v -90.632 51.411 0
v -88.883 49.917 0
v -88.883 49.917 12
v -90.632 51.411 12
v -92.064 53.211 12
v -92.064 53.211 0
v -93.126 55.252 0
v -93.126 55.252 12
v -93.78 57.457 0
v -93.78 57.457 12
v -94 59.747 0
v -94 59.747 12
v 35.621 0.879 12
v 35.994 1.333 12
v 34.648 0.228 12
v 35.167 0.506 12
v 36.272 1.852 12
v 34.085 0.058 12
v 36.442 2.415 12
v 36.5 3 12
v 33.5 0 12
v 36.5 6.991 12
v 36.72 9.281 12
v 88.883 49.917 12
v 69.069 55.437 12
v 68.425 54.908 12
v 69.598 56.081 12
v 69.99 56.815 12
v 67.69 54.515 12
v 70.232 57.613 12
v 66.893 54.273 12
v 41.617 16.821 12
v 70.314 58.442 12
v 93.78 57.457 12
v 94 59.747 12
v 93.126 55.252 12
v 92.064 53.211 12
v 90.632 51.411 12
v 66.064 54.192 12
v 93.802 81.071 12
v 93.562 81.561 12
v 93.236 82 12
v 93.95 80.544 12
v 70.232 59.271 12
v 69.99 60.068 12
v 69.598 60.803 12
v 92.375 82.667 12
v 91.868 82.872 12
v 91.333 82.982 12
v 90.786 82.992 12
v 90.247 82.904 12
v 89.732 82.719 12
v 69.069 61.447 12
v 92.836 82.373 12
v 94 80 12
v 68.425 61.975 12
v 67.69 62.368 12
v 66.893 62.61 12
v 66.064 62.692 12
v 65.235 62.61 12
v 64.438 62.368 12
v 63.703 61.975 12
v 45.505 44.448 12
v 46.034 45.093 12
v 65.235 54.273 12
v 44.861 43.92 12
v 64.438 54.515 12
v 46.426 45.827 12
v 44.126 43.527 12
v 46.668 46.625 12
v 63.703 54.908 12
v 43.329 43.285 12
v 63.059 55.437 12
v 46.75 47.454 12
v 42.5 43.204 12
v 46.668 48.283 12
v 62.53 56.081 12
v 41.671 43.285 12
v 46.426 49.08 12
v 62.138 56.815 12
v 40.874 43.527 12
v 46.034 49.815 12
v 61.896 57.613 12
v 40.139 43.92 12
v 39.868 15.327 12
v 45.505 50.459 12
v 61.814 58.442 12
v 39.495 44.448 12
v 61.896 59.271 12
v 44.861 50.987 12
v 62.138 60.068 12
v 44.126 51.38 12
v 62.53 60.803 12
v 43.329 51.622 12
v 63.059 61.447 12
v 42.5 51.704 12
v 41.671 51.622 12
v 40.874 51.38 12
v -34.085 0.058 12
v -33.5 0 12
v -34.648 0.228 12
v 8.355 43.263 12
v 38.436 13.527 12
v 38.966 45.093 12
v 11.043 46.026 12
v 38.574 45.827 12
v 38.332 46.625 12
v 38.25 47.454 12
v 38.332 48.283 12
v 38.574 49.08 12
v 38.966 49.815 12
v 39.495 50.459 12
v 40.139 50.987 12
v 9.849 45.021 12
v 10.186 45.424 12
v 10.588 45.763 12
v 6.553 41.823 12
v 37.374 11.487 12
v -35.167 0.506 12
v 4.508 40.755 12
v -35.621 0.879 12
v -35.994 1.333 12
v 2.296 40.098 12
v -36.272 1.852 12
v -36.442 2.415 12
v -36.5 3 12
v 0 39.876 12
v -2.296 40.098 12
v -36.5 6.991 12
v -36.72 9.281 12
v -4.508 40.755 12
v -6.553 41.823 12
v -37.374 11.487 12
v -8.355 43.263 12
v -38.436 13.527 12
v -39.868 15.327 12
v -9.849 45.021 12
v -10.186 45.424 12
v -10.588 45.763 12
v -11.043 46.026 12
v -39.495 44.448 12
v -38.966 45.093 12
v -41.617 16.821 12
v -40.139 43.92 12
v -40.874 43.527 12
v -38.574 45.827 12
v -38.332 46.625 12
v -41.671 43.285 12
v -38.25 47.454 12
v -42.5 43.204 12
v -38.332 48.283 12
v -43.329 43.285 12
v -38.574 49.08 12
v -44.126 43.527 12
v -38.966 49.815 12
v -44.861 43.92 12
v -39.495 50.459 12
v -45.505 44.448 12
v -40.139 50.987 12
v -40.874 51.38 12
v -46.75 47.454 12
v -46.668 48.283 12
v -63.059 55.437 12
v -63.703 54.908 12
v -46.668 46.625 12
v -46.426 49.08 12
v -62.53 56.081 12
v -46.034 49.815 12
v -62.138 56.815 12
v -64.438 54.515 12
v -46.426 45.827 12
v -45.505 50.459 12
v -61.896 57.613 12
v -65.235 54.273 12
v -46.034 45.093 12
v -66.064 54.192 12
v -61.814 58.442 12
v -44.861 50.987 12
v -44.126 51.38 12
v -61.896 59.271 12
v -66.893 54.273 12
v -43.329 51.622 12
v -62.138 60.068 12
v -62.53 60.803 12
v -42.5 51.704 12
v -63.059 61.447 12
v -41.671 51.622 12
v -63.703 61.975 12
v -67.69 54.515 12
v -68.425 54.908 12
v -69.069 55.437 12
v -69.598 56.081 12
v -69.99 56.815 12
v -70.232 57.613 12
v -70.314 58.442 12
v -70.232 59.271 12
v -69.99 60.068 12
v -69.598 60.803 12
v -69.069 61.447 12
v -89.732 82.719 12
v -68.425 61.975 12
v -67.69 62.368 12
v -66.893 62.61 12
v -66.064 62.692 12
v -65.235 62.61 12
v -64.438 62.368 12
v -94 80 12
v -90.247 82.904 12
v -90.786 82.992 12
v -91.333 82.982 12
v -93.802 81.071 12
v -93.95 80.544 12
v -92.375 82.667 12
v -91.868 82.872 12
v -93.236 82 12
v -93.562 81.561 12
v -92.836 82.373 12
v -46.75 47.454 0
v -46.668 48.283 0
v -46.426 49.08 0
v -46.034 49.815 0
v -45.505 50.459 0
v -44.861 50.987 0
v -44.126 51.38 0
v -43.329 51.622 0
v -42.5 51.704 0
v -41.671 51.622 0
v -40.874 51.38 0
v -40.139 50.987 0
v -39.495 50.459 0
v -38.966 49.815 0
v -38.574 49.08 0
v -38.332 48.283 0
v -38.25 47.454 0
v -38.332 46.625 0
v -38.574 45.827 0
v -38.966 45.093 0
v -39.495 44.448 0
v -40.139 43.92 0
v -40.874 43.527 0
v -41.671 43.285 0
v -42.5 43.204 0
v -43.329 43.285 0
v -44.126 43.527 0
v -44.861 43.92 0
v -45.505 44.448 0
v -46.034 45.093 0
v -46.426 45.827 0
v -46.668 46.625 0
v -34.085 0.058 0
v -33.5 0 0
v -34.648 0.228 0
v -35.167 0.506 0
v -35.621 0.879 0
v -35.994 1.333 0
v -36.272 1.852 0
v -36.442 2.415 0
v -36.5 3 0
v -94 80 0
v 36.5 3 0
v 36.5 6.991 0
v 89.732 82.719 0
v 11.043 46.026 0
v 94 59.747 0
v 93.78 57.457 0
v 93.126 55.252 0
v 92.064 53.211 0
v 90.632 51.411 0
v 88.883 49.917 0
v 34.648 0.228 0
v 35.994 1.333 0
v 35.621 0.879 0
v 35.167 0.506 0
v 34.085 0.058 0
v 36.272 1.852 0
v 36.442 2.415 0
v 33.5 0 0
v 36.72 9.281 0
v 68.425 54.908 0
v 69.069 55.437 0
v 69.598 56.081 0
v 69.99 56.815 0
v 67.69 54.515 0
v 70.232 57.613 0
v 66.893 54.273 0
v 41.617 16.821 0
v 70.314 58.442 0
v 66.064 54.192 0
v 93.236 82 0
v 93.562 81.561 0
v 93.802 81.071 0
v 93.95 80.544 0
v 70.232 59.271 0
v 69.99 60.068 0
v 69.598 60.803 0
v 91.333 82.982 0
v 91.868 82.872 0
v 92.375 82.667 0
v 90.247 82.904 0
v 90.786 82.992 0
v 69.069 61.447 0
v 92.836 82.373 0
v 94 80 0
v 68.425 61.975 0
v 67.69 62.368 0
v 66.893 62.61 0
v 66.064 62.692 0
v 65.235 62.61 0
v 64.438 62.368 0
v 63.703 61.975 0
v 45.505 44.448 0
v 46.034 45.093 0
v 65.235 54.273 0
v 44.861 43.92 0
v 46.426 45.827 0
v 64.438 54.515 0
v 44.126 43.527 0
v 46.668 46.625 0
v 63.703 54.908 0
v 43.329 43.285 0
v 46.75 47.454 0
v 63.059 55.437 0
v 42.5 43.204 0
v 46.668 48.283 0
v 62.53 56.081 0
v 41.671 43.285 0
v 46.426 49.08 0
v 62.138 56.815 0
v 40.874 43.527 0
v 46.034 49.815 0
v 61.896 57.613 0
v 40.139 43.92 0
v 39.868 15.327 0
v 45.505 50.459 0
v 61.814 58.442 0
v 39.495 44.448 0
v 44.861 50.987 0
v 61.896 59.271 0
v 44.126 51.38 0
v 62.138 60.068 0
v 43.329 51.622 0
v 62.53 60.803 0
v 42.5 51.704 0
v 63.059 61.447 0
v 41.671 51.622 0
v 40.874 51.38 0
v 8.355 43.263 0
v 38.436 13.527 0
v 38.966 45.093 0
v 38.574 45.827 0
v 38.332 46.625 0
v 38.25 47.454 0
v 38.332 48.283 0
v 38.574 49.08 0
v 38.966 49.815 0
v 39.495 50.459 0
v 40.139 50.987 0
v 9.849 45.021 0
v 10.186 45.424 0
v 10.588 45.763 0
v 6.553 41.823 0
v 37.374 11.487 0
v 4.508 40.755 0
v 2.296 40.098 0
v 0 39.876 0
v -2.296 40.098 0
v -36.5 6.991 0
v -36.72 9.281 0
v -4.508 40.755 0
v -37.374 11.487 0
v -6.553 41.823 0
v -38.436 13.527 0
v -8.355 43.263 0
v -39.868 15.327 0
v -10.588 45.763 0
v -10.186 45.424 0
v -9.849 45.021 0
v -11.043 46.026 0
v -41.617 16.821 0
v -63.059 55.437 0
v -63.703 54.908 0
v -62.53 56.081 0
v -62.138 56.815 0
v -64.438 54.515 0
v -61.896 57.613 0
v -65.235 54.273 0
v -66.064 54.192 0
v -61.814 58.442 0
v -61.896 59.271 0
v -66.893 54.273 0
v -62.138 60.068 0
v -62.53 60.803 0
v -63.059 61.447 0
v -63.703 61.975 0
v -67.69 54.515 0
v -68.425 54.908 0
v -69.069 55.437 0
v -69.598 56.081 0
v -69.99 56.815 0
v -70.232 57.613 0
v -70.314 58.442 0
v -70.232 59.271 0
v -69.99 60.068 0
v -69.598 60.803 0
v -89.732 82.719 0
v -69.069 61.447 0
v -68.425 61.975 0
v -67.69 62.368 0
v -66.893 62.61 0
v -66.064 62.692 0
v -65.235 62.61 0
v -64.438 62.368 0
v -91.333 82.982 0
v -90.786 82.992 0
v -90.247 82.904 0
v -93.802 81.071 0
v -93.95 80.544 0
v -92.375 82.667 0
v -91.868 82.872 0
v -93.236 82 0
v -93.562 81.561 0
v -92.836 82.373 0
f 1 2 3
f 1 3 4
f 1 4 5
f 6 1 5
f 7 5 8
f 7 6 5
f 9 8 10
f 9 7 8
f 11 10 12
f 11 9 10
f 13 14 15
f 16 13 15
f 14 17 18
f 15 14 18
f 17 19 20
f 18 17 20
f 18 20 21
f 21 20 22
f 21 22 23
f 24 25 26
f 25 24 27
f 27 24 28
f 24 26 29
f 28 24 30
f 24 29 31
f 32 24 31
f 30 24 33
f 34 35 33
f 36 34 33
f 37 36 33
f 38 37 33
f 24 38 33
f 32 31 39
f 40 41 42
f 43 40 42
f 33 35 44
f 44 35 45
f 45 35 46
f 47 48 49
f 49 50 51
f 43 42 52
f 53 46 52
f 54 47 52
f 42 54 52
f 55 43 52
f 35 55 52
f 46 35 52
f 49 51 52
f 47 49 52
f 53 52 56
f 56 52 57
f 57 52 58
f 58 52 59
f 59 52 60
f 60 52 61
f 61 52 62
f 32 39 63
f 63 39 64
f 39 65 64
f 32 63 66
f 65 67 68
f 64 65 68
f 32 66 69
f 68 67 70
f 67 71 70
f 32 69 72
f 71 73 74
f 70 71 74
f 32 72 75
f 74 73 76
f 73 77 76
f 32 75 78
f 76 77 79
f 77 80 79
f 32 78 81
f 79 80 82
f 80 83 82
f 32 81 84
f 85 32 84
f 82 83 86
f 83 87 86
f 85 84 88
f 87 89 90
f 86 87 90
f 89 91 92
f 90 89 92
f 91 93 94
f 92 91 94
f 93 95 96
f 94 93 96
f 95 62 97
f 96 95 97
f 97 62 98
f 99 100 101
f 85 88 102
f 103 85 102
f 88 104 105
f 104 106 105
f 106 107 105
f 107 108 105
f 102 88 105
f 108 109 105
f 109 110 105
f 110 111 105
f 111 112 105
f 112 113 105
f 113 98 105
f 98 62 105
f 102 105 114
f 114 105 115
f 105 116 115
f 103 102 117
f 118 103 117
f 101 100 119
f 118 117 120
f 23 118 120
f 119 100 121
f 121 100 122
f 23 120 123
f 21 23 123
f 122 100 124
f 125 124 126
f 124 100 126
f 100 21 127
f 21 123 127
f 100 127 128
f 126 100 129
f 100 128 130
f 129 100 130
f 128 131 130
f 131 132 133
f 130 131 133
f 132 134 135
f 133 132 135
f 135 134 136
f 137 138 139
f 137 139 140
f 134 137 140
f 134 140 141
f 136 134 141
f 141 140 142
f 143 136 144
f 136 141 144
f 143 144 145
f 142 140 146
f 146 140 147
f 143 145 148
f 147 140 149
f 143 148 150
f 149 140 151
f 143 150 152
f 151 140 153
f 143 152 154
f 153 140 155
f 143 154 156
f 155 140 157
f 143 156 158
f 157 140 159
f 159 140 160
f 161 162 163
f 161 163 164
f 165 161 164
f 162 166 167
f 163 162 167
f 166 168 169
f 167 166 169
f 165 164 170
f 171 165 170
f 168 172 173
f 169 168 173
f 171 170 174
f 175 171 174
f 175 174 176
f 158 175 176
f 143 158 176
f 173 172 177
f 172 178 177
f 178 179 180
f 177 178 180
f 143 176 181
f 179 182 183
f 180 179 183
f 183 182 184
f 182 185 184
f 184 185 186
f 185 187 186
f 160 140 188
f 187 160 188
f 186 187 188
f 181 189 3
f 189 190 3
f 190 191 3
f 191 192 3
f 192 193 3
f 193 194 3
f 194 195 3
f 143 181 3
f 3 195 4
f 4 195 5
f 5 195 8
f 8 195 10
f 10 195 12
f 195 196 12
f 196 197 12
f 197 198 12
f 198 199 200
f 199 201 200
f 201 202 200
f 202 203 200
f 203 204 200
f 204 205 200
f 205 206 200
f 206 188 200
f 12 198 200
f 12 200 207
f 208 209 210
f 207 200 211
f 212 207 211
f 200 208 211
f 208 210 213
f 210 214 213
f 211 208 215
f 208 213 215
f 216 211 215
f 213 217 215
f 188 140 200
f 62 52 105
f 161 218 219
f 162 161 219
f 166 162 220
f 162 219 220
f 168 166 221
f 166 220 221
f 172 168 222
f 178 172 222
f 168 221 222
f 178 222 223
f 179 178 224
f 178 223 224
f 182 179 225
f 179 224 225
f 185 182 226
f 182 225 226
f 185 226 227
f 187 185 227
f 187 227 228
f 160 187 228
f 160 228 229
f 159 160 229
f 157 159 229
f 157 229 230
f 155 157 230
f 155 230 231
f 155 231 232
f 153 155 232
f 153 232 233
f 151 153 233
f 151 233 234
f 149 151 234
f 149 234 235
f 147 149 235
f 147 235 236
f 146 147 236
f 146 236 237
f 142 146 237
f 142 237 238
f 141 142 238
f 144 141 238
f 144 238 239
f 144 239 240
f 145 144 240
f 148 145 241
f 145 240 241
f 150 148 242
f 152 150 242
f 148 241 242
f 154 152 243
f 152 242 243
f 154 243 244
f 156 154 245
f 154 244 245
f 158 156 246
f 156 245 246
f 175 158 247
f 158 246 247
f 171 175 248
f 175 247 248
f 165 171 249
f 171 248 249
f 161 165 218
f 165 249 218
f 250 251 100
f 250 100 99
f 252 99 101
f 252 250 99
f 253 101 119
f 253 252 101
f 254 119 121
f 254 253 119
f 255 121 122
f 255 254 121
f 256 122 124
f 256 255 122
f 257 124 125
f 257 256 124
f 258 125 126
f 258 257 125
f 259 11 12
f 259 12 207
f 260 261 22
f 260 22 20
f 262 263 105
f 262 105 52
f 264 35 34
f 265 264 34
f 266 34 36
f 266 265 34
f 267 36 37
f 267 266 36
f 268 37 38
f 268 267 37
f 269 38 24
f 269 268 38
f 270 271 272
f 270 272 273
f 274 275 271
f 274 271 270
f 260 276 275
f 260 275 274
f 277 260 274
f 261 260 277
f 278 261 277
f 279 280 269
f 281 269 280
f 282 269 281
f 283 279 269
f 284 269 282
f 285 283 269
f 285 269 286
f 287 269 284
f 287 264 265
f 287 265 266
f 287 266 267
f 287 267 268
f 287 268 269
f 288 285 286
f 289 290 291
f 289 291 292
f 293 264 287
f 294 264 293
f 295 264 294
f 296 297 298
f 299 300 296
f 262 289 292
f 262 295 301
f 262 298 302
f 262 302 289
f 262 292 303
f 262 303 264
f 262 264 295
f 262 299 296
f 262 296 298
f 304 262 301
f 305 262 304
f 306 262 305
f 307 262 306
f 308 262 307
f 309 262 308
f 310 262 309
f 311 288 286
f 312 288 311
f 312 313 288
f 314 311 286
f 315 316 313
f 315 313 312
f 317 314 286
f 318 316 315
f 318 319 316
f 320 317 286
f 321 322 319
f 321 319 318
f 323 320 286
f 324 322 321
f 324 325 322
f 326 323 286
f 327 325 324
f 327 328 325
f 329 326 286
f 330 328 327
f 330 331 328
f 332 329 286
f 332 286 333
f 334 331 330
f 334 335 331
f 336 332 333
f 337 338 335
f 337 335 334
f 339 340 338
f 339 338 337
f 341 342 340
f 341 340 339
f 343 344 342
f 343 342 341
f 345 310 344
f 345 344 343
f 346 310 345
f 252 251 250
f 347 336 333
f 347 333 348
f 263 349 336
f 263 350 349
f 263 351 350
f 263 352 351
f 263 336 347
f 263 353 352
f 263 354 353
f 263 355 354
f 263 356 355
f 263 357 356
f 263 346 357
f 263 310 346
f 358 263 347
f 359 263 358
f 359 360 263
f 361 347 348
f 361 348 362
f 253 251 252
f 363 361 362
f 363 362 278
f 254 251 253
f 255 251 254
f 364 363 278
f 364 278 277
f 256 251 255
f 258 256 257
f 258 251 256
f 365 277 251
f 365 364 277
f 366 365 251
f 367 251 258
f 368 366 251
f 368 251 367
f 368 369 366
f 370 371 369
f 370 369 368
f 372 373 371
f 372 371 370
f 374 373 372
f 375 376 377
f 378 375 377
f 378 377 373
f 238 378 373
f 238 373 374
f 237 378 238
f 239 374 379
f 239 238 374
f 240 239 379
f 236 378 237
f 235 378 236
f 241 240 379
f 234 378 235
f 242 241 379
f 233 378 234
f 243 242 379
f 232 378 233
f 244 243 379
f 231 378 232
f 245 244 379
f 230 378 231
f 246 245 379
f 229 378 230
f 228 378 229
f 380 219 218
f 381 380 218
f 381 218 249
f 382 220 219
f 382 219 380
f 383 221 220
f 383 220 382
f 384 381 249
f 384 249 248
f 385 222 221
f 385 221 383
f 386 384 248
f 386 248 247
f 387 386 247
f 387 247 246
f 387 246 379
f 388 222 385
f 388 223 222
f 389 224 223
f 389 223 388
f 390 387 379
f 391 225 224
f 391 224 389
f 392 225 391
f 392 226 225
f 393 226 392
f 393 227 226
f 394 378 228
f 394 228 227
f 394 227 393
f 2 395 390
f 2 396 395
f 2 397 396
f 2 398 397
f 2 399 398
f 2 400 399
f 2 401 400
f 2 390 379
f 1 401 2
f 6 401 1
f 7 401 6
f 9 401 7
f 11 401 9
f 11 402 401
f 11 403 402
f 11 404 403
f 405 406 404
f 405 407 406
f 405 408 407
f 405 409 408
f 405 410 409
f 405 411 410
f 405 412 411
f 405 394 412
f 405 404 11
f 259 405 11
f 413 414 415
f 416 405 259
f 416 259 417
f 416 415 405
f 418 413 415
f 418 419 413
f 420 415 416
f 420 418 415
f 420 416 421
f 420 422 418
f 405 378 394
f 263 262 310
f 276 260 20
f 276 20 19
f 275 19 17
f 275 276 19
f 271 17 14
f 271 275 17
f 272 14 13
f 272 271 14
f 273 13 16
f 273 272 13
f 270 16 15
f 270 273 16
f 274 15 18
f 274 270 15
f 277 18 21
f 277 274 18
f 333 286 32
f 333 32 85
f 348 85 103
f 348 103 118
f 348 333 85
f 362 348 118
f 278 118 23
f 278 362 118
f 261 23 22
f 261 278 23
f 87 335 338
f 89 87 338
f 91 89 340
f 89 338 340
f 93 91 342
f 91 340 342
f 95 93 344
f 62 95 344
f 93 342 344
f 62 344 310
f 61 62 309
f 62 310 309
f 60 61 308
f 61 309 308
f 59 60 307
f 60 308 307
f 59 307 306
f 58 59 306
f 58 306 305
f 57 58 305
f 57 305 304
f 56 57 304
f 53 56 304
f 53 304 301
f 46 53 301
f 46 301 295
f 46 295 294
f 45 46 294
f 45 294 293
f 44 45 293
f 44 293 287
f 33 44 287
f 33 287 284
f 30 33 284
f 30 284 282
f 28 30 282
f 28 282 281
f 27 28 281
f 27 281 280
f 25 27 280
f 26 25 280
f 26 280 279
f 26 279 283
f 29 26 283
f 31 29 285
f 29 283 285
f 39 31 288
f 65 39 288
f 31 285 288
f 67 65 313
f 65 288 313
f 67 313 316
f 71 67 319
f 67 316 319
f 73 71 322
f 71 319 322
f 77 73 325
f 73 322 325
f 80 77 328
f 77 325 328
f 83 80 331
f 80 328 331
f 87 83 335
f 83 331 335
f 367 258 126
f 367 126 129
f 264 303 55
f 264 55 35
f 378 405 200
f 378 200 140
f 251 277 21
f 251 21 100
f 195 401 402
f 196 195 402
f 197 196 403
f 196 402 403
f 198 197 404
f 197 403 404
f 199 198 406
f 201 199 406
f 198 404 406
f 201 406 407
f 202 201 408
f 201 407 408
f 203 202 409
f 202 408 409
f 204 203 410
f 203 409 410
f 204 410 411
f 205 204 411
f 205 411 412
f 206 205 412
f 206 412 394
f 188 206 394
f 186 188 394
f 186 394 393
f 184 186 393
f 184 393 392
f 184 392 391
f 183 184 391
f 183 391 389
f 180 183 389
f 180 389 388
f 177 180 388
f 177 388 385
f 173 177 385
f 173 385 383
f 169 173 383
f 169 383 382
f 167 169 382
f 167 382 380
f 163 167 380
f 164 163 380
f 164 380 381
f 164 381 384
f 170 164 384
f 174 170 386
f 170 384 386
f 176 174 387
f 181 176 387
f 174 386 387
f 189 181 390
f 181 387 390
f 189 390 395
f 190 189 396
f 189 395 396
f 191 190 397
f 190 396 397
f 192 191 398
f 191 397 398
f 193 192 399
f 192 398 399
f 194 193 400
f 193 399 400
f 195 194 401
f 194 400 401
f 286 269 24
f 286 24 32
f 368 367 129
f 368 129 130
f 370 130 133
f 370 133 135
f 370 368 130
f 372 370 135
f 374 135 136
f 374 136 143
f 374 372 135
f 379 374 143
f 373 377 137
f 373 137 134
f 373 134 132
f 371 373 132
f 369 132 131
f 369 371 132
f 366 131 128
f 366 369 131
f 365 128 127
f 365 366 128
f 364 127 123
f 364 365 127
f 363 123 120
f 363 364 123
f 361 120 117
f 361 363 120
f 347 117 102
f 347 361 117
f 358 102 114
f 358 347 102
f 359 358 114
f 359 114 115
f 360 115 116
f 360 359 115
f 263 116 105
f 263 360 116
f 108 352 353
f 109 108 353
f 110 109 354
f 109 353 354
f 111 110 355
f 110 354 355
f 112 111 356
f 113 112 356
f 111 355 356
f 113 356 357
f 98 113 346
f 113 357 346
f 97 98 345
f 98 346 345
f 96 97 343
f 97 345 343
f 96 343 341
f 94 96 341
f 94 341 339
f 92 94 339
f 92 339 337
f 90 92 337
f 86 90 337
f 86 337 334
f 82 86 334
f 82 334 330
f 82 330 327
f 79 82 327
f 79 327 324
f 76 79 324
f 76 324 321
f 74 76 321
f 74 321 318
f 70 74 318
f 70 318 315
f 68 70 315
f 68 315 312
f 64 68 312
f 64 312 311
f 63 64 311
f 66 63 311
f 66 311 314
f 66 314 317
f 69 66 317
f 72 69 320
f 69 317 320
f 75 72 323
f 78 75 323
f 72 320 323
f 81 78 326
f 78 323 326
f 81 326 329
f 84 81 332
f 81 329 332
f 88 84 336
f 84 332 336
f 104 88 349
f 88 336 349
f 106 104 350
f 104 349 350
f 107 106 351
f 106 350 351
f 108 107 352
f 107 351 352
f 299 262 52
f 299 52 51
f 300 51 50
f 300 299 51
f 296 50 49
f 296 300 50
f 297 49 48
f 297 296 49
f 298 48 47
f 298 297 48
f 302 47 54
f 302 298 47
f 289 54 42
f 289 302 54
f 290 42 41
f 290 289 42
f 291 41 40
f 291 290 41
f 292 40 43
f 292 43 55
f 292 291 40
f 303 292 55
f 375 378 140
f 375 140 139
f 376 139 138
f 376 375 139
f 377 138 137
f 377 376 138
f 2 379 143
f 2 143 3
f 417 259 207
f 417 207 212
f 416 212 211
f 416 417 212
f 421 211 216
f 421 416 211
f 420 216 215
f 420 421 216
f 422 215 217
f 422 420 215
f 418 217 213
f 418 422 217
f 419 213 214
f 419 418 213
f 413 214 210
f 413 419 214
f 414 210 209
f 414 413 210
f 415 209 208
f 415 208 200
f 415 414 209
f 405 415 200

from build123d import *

# Parameters (mm, degrees)
EXTRUDE1_DEPTH         = 12
M10_GEVINDHULLER_D     = 8.5
M10_GEVINDHULLER_DEPTH = 22
M10_GEVINDHULLER_TIP   = 2.553657631


with BuildPart() as part:
    # Sketch1 → Extrude1 (new body)
    with BuildSketch(Plane.XY):
        with BuildLine():
            Line((36.5, 6.991261946), (36.5, 3))
            ThreePointArc((36.5, 3), (35.621320344, 0.878679656), (33.5, 0))
            Line((33.5, 0), (0, 0))
            Line((0, 0), (-33.5, 0))
            ThreePointArc((-33.5, 0), (-35.621320344, 0.878679656), (-36.5, 3))
            Line((-36.5, 3), (-36.5, 6.991261946))
            ThreePointArc((-36.5, 6.991261946), (-37.855870002, 12.532245305), (-41.617082764, 16.821086478))
            Line((-41.617082764, 16.821086478), (-88.882917236, 49.916980075))
            ThreePointArc((-88.882917236, 49.916980075), (-92.644129998, 54.205821248), (-94, 59.746804607))
            Line((-94, 59.746804607), (-94, 80))
            ThreePointArc((-94, 80), (-92.611898825, 82.530174337), (-89.732145215, 82.718923361))
            Line((-89.732145215, 82.718923361), (-11.04340479, 46.02576109))
            ThreePointArc((-11.04340479, 46.02576109), (-10.379689702, 45.602276211), (-9.84900766, 45.020697556))
            ThreePointArc((-9.84900766, 45.020697556), (0, 39.876136865), (9.84900766, 45.020697556))
            ThreePointArc((9.84900766, 45.020697556), (10.379689702, 45.602276211), (11.04340479, 46.02576109))
            Line((11.04340479, 46.02576109), (89.732145215, 82.718923361))
            ThreePointArc((89.732145215, 82.718923361), (92.611898825, 82.530174337), (94, 80))
            Line((94, 80), (94, 59.746804607))
            ThreePointArc((94, 59.746804607), (92.644129998, 54.205821248), (88.882917236, 49.916980075))
            Line((88.882917236, 49.916980075), (41.617082764, 16.821086478))
            ThreePointArc((41.617082764, 16.821086478), (37.855870002, 12.532245305), (36.5, 6.991261946))
        make_face()
    extrude(amount=EXTRUDE1_DEPTH)

    # M10 gevindhuller
    with Locations(Plane.XY.offset(12)):
        with Locations((-66.064002463, 58.441752114), (-42.5, 47.453677309), (66.064002463, 58.441752114), (42.5, 47.453677309)):
            Hole(M10_GEVINDHULLER_D / 2, depth=M10_GEVINDHULLER_DEPTH)
            with Locations((0, 0, -(M10_GEVINDHULLER_DEPTH + M10_GEVINDHULLER_TIP / 2))):  # 118° drill point
                Cone(0, M10_GEVINDHULLER_D / 2, M10_GEVINDHULLER_TIP, mode=Mode.SUBTRACT)


solid = part.part
